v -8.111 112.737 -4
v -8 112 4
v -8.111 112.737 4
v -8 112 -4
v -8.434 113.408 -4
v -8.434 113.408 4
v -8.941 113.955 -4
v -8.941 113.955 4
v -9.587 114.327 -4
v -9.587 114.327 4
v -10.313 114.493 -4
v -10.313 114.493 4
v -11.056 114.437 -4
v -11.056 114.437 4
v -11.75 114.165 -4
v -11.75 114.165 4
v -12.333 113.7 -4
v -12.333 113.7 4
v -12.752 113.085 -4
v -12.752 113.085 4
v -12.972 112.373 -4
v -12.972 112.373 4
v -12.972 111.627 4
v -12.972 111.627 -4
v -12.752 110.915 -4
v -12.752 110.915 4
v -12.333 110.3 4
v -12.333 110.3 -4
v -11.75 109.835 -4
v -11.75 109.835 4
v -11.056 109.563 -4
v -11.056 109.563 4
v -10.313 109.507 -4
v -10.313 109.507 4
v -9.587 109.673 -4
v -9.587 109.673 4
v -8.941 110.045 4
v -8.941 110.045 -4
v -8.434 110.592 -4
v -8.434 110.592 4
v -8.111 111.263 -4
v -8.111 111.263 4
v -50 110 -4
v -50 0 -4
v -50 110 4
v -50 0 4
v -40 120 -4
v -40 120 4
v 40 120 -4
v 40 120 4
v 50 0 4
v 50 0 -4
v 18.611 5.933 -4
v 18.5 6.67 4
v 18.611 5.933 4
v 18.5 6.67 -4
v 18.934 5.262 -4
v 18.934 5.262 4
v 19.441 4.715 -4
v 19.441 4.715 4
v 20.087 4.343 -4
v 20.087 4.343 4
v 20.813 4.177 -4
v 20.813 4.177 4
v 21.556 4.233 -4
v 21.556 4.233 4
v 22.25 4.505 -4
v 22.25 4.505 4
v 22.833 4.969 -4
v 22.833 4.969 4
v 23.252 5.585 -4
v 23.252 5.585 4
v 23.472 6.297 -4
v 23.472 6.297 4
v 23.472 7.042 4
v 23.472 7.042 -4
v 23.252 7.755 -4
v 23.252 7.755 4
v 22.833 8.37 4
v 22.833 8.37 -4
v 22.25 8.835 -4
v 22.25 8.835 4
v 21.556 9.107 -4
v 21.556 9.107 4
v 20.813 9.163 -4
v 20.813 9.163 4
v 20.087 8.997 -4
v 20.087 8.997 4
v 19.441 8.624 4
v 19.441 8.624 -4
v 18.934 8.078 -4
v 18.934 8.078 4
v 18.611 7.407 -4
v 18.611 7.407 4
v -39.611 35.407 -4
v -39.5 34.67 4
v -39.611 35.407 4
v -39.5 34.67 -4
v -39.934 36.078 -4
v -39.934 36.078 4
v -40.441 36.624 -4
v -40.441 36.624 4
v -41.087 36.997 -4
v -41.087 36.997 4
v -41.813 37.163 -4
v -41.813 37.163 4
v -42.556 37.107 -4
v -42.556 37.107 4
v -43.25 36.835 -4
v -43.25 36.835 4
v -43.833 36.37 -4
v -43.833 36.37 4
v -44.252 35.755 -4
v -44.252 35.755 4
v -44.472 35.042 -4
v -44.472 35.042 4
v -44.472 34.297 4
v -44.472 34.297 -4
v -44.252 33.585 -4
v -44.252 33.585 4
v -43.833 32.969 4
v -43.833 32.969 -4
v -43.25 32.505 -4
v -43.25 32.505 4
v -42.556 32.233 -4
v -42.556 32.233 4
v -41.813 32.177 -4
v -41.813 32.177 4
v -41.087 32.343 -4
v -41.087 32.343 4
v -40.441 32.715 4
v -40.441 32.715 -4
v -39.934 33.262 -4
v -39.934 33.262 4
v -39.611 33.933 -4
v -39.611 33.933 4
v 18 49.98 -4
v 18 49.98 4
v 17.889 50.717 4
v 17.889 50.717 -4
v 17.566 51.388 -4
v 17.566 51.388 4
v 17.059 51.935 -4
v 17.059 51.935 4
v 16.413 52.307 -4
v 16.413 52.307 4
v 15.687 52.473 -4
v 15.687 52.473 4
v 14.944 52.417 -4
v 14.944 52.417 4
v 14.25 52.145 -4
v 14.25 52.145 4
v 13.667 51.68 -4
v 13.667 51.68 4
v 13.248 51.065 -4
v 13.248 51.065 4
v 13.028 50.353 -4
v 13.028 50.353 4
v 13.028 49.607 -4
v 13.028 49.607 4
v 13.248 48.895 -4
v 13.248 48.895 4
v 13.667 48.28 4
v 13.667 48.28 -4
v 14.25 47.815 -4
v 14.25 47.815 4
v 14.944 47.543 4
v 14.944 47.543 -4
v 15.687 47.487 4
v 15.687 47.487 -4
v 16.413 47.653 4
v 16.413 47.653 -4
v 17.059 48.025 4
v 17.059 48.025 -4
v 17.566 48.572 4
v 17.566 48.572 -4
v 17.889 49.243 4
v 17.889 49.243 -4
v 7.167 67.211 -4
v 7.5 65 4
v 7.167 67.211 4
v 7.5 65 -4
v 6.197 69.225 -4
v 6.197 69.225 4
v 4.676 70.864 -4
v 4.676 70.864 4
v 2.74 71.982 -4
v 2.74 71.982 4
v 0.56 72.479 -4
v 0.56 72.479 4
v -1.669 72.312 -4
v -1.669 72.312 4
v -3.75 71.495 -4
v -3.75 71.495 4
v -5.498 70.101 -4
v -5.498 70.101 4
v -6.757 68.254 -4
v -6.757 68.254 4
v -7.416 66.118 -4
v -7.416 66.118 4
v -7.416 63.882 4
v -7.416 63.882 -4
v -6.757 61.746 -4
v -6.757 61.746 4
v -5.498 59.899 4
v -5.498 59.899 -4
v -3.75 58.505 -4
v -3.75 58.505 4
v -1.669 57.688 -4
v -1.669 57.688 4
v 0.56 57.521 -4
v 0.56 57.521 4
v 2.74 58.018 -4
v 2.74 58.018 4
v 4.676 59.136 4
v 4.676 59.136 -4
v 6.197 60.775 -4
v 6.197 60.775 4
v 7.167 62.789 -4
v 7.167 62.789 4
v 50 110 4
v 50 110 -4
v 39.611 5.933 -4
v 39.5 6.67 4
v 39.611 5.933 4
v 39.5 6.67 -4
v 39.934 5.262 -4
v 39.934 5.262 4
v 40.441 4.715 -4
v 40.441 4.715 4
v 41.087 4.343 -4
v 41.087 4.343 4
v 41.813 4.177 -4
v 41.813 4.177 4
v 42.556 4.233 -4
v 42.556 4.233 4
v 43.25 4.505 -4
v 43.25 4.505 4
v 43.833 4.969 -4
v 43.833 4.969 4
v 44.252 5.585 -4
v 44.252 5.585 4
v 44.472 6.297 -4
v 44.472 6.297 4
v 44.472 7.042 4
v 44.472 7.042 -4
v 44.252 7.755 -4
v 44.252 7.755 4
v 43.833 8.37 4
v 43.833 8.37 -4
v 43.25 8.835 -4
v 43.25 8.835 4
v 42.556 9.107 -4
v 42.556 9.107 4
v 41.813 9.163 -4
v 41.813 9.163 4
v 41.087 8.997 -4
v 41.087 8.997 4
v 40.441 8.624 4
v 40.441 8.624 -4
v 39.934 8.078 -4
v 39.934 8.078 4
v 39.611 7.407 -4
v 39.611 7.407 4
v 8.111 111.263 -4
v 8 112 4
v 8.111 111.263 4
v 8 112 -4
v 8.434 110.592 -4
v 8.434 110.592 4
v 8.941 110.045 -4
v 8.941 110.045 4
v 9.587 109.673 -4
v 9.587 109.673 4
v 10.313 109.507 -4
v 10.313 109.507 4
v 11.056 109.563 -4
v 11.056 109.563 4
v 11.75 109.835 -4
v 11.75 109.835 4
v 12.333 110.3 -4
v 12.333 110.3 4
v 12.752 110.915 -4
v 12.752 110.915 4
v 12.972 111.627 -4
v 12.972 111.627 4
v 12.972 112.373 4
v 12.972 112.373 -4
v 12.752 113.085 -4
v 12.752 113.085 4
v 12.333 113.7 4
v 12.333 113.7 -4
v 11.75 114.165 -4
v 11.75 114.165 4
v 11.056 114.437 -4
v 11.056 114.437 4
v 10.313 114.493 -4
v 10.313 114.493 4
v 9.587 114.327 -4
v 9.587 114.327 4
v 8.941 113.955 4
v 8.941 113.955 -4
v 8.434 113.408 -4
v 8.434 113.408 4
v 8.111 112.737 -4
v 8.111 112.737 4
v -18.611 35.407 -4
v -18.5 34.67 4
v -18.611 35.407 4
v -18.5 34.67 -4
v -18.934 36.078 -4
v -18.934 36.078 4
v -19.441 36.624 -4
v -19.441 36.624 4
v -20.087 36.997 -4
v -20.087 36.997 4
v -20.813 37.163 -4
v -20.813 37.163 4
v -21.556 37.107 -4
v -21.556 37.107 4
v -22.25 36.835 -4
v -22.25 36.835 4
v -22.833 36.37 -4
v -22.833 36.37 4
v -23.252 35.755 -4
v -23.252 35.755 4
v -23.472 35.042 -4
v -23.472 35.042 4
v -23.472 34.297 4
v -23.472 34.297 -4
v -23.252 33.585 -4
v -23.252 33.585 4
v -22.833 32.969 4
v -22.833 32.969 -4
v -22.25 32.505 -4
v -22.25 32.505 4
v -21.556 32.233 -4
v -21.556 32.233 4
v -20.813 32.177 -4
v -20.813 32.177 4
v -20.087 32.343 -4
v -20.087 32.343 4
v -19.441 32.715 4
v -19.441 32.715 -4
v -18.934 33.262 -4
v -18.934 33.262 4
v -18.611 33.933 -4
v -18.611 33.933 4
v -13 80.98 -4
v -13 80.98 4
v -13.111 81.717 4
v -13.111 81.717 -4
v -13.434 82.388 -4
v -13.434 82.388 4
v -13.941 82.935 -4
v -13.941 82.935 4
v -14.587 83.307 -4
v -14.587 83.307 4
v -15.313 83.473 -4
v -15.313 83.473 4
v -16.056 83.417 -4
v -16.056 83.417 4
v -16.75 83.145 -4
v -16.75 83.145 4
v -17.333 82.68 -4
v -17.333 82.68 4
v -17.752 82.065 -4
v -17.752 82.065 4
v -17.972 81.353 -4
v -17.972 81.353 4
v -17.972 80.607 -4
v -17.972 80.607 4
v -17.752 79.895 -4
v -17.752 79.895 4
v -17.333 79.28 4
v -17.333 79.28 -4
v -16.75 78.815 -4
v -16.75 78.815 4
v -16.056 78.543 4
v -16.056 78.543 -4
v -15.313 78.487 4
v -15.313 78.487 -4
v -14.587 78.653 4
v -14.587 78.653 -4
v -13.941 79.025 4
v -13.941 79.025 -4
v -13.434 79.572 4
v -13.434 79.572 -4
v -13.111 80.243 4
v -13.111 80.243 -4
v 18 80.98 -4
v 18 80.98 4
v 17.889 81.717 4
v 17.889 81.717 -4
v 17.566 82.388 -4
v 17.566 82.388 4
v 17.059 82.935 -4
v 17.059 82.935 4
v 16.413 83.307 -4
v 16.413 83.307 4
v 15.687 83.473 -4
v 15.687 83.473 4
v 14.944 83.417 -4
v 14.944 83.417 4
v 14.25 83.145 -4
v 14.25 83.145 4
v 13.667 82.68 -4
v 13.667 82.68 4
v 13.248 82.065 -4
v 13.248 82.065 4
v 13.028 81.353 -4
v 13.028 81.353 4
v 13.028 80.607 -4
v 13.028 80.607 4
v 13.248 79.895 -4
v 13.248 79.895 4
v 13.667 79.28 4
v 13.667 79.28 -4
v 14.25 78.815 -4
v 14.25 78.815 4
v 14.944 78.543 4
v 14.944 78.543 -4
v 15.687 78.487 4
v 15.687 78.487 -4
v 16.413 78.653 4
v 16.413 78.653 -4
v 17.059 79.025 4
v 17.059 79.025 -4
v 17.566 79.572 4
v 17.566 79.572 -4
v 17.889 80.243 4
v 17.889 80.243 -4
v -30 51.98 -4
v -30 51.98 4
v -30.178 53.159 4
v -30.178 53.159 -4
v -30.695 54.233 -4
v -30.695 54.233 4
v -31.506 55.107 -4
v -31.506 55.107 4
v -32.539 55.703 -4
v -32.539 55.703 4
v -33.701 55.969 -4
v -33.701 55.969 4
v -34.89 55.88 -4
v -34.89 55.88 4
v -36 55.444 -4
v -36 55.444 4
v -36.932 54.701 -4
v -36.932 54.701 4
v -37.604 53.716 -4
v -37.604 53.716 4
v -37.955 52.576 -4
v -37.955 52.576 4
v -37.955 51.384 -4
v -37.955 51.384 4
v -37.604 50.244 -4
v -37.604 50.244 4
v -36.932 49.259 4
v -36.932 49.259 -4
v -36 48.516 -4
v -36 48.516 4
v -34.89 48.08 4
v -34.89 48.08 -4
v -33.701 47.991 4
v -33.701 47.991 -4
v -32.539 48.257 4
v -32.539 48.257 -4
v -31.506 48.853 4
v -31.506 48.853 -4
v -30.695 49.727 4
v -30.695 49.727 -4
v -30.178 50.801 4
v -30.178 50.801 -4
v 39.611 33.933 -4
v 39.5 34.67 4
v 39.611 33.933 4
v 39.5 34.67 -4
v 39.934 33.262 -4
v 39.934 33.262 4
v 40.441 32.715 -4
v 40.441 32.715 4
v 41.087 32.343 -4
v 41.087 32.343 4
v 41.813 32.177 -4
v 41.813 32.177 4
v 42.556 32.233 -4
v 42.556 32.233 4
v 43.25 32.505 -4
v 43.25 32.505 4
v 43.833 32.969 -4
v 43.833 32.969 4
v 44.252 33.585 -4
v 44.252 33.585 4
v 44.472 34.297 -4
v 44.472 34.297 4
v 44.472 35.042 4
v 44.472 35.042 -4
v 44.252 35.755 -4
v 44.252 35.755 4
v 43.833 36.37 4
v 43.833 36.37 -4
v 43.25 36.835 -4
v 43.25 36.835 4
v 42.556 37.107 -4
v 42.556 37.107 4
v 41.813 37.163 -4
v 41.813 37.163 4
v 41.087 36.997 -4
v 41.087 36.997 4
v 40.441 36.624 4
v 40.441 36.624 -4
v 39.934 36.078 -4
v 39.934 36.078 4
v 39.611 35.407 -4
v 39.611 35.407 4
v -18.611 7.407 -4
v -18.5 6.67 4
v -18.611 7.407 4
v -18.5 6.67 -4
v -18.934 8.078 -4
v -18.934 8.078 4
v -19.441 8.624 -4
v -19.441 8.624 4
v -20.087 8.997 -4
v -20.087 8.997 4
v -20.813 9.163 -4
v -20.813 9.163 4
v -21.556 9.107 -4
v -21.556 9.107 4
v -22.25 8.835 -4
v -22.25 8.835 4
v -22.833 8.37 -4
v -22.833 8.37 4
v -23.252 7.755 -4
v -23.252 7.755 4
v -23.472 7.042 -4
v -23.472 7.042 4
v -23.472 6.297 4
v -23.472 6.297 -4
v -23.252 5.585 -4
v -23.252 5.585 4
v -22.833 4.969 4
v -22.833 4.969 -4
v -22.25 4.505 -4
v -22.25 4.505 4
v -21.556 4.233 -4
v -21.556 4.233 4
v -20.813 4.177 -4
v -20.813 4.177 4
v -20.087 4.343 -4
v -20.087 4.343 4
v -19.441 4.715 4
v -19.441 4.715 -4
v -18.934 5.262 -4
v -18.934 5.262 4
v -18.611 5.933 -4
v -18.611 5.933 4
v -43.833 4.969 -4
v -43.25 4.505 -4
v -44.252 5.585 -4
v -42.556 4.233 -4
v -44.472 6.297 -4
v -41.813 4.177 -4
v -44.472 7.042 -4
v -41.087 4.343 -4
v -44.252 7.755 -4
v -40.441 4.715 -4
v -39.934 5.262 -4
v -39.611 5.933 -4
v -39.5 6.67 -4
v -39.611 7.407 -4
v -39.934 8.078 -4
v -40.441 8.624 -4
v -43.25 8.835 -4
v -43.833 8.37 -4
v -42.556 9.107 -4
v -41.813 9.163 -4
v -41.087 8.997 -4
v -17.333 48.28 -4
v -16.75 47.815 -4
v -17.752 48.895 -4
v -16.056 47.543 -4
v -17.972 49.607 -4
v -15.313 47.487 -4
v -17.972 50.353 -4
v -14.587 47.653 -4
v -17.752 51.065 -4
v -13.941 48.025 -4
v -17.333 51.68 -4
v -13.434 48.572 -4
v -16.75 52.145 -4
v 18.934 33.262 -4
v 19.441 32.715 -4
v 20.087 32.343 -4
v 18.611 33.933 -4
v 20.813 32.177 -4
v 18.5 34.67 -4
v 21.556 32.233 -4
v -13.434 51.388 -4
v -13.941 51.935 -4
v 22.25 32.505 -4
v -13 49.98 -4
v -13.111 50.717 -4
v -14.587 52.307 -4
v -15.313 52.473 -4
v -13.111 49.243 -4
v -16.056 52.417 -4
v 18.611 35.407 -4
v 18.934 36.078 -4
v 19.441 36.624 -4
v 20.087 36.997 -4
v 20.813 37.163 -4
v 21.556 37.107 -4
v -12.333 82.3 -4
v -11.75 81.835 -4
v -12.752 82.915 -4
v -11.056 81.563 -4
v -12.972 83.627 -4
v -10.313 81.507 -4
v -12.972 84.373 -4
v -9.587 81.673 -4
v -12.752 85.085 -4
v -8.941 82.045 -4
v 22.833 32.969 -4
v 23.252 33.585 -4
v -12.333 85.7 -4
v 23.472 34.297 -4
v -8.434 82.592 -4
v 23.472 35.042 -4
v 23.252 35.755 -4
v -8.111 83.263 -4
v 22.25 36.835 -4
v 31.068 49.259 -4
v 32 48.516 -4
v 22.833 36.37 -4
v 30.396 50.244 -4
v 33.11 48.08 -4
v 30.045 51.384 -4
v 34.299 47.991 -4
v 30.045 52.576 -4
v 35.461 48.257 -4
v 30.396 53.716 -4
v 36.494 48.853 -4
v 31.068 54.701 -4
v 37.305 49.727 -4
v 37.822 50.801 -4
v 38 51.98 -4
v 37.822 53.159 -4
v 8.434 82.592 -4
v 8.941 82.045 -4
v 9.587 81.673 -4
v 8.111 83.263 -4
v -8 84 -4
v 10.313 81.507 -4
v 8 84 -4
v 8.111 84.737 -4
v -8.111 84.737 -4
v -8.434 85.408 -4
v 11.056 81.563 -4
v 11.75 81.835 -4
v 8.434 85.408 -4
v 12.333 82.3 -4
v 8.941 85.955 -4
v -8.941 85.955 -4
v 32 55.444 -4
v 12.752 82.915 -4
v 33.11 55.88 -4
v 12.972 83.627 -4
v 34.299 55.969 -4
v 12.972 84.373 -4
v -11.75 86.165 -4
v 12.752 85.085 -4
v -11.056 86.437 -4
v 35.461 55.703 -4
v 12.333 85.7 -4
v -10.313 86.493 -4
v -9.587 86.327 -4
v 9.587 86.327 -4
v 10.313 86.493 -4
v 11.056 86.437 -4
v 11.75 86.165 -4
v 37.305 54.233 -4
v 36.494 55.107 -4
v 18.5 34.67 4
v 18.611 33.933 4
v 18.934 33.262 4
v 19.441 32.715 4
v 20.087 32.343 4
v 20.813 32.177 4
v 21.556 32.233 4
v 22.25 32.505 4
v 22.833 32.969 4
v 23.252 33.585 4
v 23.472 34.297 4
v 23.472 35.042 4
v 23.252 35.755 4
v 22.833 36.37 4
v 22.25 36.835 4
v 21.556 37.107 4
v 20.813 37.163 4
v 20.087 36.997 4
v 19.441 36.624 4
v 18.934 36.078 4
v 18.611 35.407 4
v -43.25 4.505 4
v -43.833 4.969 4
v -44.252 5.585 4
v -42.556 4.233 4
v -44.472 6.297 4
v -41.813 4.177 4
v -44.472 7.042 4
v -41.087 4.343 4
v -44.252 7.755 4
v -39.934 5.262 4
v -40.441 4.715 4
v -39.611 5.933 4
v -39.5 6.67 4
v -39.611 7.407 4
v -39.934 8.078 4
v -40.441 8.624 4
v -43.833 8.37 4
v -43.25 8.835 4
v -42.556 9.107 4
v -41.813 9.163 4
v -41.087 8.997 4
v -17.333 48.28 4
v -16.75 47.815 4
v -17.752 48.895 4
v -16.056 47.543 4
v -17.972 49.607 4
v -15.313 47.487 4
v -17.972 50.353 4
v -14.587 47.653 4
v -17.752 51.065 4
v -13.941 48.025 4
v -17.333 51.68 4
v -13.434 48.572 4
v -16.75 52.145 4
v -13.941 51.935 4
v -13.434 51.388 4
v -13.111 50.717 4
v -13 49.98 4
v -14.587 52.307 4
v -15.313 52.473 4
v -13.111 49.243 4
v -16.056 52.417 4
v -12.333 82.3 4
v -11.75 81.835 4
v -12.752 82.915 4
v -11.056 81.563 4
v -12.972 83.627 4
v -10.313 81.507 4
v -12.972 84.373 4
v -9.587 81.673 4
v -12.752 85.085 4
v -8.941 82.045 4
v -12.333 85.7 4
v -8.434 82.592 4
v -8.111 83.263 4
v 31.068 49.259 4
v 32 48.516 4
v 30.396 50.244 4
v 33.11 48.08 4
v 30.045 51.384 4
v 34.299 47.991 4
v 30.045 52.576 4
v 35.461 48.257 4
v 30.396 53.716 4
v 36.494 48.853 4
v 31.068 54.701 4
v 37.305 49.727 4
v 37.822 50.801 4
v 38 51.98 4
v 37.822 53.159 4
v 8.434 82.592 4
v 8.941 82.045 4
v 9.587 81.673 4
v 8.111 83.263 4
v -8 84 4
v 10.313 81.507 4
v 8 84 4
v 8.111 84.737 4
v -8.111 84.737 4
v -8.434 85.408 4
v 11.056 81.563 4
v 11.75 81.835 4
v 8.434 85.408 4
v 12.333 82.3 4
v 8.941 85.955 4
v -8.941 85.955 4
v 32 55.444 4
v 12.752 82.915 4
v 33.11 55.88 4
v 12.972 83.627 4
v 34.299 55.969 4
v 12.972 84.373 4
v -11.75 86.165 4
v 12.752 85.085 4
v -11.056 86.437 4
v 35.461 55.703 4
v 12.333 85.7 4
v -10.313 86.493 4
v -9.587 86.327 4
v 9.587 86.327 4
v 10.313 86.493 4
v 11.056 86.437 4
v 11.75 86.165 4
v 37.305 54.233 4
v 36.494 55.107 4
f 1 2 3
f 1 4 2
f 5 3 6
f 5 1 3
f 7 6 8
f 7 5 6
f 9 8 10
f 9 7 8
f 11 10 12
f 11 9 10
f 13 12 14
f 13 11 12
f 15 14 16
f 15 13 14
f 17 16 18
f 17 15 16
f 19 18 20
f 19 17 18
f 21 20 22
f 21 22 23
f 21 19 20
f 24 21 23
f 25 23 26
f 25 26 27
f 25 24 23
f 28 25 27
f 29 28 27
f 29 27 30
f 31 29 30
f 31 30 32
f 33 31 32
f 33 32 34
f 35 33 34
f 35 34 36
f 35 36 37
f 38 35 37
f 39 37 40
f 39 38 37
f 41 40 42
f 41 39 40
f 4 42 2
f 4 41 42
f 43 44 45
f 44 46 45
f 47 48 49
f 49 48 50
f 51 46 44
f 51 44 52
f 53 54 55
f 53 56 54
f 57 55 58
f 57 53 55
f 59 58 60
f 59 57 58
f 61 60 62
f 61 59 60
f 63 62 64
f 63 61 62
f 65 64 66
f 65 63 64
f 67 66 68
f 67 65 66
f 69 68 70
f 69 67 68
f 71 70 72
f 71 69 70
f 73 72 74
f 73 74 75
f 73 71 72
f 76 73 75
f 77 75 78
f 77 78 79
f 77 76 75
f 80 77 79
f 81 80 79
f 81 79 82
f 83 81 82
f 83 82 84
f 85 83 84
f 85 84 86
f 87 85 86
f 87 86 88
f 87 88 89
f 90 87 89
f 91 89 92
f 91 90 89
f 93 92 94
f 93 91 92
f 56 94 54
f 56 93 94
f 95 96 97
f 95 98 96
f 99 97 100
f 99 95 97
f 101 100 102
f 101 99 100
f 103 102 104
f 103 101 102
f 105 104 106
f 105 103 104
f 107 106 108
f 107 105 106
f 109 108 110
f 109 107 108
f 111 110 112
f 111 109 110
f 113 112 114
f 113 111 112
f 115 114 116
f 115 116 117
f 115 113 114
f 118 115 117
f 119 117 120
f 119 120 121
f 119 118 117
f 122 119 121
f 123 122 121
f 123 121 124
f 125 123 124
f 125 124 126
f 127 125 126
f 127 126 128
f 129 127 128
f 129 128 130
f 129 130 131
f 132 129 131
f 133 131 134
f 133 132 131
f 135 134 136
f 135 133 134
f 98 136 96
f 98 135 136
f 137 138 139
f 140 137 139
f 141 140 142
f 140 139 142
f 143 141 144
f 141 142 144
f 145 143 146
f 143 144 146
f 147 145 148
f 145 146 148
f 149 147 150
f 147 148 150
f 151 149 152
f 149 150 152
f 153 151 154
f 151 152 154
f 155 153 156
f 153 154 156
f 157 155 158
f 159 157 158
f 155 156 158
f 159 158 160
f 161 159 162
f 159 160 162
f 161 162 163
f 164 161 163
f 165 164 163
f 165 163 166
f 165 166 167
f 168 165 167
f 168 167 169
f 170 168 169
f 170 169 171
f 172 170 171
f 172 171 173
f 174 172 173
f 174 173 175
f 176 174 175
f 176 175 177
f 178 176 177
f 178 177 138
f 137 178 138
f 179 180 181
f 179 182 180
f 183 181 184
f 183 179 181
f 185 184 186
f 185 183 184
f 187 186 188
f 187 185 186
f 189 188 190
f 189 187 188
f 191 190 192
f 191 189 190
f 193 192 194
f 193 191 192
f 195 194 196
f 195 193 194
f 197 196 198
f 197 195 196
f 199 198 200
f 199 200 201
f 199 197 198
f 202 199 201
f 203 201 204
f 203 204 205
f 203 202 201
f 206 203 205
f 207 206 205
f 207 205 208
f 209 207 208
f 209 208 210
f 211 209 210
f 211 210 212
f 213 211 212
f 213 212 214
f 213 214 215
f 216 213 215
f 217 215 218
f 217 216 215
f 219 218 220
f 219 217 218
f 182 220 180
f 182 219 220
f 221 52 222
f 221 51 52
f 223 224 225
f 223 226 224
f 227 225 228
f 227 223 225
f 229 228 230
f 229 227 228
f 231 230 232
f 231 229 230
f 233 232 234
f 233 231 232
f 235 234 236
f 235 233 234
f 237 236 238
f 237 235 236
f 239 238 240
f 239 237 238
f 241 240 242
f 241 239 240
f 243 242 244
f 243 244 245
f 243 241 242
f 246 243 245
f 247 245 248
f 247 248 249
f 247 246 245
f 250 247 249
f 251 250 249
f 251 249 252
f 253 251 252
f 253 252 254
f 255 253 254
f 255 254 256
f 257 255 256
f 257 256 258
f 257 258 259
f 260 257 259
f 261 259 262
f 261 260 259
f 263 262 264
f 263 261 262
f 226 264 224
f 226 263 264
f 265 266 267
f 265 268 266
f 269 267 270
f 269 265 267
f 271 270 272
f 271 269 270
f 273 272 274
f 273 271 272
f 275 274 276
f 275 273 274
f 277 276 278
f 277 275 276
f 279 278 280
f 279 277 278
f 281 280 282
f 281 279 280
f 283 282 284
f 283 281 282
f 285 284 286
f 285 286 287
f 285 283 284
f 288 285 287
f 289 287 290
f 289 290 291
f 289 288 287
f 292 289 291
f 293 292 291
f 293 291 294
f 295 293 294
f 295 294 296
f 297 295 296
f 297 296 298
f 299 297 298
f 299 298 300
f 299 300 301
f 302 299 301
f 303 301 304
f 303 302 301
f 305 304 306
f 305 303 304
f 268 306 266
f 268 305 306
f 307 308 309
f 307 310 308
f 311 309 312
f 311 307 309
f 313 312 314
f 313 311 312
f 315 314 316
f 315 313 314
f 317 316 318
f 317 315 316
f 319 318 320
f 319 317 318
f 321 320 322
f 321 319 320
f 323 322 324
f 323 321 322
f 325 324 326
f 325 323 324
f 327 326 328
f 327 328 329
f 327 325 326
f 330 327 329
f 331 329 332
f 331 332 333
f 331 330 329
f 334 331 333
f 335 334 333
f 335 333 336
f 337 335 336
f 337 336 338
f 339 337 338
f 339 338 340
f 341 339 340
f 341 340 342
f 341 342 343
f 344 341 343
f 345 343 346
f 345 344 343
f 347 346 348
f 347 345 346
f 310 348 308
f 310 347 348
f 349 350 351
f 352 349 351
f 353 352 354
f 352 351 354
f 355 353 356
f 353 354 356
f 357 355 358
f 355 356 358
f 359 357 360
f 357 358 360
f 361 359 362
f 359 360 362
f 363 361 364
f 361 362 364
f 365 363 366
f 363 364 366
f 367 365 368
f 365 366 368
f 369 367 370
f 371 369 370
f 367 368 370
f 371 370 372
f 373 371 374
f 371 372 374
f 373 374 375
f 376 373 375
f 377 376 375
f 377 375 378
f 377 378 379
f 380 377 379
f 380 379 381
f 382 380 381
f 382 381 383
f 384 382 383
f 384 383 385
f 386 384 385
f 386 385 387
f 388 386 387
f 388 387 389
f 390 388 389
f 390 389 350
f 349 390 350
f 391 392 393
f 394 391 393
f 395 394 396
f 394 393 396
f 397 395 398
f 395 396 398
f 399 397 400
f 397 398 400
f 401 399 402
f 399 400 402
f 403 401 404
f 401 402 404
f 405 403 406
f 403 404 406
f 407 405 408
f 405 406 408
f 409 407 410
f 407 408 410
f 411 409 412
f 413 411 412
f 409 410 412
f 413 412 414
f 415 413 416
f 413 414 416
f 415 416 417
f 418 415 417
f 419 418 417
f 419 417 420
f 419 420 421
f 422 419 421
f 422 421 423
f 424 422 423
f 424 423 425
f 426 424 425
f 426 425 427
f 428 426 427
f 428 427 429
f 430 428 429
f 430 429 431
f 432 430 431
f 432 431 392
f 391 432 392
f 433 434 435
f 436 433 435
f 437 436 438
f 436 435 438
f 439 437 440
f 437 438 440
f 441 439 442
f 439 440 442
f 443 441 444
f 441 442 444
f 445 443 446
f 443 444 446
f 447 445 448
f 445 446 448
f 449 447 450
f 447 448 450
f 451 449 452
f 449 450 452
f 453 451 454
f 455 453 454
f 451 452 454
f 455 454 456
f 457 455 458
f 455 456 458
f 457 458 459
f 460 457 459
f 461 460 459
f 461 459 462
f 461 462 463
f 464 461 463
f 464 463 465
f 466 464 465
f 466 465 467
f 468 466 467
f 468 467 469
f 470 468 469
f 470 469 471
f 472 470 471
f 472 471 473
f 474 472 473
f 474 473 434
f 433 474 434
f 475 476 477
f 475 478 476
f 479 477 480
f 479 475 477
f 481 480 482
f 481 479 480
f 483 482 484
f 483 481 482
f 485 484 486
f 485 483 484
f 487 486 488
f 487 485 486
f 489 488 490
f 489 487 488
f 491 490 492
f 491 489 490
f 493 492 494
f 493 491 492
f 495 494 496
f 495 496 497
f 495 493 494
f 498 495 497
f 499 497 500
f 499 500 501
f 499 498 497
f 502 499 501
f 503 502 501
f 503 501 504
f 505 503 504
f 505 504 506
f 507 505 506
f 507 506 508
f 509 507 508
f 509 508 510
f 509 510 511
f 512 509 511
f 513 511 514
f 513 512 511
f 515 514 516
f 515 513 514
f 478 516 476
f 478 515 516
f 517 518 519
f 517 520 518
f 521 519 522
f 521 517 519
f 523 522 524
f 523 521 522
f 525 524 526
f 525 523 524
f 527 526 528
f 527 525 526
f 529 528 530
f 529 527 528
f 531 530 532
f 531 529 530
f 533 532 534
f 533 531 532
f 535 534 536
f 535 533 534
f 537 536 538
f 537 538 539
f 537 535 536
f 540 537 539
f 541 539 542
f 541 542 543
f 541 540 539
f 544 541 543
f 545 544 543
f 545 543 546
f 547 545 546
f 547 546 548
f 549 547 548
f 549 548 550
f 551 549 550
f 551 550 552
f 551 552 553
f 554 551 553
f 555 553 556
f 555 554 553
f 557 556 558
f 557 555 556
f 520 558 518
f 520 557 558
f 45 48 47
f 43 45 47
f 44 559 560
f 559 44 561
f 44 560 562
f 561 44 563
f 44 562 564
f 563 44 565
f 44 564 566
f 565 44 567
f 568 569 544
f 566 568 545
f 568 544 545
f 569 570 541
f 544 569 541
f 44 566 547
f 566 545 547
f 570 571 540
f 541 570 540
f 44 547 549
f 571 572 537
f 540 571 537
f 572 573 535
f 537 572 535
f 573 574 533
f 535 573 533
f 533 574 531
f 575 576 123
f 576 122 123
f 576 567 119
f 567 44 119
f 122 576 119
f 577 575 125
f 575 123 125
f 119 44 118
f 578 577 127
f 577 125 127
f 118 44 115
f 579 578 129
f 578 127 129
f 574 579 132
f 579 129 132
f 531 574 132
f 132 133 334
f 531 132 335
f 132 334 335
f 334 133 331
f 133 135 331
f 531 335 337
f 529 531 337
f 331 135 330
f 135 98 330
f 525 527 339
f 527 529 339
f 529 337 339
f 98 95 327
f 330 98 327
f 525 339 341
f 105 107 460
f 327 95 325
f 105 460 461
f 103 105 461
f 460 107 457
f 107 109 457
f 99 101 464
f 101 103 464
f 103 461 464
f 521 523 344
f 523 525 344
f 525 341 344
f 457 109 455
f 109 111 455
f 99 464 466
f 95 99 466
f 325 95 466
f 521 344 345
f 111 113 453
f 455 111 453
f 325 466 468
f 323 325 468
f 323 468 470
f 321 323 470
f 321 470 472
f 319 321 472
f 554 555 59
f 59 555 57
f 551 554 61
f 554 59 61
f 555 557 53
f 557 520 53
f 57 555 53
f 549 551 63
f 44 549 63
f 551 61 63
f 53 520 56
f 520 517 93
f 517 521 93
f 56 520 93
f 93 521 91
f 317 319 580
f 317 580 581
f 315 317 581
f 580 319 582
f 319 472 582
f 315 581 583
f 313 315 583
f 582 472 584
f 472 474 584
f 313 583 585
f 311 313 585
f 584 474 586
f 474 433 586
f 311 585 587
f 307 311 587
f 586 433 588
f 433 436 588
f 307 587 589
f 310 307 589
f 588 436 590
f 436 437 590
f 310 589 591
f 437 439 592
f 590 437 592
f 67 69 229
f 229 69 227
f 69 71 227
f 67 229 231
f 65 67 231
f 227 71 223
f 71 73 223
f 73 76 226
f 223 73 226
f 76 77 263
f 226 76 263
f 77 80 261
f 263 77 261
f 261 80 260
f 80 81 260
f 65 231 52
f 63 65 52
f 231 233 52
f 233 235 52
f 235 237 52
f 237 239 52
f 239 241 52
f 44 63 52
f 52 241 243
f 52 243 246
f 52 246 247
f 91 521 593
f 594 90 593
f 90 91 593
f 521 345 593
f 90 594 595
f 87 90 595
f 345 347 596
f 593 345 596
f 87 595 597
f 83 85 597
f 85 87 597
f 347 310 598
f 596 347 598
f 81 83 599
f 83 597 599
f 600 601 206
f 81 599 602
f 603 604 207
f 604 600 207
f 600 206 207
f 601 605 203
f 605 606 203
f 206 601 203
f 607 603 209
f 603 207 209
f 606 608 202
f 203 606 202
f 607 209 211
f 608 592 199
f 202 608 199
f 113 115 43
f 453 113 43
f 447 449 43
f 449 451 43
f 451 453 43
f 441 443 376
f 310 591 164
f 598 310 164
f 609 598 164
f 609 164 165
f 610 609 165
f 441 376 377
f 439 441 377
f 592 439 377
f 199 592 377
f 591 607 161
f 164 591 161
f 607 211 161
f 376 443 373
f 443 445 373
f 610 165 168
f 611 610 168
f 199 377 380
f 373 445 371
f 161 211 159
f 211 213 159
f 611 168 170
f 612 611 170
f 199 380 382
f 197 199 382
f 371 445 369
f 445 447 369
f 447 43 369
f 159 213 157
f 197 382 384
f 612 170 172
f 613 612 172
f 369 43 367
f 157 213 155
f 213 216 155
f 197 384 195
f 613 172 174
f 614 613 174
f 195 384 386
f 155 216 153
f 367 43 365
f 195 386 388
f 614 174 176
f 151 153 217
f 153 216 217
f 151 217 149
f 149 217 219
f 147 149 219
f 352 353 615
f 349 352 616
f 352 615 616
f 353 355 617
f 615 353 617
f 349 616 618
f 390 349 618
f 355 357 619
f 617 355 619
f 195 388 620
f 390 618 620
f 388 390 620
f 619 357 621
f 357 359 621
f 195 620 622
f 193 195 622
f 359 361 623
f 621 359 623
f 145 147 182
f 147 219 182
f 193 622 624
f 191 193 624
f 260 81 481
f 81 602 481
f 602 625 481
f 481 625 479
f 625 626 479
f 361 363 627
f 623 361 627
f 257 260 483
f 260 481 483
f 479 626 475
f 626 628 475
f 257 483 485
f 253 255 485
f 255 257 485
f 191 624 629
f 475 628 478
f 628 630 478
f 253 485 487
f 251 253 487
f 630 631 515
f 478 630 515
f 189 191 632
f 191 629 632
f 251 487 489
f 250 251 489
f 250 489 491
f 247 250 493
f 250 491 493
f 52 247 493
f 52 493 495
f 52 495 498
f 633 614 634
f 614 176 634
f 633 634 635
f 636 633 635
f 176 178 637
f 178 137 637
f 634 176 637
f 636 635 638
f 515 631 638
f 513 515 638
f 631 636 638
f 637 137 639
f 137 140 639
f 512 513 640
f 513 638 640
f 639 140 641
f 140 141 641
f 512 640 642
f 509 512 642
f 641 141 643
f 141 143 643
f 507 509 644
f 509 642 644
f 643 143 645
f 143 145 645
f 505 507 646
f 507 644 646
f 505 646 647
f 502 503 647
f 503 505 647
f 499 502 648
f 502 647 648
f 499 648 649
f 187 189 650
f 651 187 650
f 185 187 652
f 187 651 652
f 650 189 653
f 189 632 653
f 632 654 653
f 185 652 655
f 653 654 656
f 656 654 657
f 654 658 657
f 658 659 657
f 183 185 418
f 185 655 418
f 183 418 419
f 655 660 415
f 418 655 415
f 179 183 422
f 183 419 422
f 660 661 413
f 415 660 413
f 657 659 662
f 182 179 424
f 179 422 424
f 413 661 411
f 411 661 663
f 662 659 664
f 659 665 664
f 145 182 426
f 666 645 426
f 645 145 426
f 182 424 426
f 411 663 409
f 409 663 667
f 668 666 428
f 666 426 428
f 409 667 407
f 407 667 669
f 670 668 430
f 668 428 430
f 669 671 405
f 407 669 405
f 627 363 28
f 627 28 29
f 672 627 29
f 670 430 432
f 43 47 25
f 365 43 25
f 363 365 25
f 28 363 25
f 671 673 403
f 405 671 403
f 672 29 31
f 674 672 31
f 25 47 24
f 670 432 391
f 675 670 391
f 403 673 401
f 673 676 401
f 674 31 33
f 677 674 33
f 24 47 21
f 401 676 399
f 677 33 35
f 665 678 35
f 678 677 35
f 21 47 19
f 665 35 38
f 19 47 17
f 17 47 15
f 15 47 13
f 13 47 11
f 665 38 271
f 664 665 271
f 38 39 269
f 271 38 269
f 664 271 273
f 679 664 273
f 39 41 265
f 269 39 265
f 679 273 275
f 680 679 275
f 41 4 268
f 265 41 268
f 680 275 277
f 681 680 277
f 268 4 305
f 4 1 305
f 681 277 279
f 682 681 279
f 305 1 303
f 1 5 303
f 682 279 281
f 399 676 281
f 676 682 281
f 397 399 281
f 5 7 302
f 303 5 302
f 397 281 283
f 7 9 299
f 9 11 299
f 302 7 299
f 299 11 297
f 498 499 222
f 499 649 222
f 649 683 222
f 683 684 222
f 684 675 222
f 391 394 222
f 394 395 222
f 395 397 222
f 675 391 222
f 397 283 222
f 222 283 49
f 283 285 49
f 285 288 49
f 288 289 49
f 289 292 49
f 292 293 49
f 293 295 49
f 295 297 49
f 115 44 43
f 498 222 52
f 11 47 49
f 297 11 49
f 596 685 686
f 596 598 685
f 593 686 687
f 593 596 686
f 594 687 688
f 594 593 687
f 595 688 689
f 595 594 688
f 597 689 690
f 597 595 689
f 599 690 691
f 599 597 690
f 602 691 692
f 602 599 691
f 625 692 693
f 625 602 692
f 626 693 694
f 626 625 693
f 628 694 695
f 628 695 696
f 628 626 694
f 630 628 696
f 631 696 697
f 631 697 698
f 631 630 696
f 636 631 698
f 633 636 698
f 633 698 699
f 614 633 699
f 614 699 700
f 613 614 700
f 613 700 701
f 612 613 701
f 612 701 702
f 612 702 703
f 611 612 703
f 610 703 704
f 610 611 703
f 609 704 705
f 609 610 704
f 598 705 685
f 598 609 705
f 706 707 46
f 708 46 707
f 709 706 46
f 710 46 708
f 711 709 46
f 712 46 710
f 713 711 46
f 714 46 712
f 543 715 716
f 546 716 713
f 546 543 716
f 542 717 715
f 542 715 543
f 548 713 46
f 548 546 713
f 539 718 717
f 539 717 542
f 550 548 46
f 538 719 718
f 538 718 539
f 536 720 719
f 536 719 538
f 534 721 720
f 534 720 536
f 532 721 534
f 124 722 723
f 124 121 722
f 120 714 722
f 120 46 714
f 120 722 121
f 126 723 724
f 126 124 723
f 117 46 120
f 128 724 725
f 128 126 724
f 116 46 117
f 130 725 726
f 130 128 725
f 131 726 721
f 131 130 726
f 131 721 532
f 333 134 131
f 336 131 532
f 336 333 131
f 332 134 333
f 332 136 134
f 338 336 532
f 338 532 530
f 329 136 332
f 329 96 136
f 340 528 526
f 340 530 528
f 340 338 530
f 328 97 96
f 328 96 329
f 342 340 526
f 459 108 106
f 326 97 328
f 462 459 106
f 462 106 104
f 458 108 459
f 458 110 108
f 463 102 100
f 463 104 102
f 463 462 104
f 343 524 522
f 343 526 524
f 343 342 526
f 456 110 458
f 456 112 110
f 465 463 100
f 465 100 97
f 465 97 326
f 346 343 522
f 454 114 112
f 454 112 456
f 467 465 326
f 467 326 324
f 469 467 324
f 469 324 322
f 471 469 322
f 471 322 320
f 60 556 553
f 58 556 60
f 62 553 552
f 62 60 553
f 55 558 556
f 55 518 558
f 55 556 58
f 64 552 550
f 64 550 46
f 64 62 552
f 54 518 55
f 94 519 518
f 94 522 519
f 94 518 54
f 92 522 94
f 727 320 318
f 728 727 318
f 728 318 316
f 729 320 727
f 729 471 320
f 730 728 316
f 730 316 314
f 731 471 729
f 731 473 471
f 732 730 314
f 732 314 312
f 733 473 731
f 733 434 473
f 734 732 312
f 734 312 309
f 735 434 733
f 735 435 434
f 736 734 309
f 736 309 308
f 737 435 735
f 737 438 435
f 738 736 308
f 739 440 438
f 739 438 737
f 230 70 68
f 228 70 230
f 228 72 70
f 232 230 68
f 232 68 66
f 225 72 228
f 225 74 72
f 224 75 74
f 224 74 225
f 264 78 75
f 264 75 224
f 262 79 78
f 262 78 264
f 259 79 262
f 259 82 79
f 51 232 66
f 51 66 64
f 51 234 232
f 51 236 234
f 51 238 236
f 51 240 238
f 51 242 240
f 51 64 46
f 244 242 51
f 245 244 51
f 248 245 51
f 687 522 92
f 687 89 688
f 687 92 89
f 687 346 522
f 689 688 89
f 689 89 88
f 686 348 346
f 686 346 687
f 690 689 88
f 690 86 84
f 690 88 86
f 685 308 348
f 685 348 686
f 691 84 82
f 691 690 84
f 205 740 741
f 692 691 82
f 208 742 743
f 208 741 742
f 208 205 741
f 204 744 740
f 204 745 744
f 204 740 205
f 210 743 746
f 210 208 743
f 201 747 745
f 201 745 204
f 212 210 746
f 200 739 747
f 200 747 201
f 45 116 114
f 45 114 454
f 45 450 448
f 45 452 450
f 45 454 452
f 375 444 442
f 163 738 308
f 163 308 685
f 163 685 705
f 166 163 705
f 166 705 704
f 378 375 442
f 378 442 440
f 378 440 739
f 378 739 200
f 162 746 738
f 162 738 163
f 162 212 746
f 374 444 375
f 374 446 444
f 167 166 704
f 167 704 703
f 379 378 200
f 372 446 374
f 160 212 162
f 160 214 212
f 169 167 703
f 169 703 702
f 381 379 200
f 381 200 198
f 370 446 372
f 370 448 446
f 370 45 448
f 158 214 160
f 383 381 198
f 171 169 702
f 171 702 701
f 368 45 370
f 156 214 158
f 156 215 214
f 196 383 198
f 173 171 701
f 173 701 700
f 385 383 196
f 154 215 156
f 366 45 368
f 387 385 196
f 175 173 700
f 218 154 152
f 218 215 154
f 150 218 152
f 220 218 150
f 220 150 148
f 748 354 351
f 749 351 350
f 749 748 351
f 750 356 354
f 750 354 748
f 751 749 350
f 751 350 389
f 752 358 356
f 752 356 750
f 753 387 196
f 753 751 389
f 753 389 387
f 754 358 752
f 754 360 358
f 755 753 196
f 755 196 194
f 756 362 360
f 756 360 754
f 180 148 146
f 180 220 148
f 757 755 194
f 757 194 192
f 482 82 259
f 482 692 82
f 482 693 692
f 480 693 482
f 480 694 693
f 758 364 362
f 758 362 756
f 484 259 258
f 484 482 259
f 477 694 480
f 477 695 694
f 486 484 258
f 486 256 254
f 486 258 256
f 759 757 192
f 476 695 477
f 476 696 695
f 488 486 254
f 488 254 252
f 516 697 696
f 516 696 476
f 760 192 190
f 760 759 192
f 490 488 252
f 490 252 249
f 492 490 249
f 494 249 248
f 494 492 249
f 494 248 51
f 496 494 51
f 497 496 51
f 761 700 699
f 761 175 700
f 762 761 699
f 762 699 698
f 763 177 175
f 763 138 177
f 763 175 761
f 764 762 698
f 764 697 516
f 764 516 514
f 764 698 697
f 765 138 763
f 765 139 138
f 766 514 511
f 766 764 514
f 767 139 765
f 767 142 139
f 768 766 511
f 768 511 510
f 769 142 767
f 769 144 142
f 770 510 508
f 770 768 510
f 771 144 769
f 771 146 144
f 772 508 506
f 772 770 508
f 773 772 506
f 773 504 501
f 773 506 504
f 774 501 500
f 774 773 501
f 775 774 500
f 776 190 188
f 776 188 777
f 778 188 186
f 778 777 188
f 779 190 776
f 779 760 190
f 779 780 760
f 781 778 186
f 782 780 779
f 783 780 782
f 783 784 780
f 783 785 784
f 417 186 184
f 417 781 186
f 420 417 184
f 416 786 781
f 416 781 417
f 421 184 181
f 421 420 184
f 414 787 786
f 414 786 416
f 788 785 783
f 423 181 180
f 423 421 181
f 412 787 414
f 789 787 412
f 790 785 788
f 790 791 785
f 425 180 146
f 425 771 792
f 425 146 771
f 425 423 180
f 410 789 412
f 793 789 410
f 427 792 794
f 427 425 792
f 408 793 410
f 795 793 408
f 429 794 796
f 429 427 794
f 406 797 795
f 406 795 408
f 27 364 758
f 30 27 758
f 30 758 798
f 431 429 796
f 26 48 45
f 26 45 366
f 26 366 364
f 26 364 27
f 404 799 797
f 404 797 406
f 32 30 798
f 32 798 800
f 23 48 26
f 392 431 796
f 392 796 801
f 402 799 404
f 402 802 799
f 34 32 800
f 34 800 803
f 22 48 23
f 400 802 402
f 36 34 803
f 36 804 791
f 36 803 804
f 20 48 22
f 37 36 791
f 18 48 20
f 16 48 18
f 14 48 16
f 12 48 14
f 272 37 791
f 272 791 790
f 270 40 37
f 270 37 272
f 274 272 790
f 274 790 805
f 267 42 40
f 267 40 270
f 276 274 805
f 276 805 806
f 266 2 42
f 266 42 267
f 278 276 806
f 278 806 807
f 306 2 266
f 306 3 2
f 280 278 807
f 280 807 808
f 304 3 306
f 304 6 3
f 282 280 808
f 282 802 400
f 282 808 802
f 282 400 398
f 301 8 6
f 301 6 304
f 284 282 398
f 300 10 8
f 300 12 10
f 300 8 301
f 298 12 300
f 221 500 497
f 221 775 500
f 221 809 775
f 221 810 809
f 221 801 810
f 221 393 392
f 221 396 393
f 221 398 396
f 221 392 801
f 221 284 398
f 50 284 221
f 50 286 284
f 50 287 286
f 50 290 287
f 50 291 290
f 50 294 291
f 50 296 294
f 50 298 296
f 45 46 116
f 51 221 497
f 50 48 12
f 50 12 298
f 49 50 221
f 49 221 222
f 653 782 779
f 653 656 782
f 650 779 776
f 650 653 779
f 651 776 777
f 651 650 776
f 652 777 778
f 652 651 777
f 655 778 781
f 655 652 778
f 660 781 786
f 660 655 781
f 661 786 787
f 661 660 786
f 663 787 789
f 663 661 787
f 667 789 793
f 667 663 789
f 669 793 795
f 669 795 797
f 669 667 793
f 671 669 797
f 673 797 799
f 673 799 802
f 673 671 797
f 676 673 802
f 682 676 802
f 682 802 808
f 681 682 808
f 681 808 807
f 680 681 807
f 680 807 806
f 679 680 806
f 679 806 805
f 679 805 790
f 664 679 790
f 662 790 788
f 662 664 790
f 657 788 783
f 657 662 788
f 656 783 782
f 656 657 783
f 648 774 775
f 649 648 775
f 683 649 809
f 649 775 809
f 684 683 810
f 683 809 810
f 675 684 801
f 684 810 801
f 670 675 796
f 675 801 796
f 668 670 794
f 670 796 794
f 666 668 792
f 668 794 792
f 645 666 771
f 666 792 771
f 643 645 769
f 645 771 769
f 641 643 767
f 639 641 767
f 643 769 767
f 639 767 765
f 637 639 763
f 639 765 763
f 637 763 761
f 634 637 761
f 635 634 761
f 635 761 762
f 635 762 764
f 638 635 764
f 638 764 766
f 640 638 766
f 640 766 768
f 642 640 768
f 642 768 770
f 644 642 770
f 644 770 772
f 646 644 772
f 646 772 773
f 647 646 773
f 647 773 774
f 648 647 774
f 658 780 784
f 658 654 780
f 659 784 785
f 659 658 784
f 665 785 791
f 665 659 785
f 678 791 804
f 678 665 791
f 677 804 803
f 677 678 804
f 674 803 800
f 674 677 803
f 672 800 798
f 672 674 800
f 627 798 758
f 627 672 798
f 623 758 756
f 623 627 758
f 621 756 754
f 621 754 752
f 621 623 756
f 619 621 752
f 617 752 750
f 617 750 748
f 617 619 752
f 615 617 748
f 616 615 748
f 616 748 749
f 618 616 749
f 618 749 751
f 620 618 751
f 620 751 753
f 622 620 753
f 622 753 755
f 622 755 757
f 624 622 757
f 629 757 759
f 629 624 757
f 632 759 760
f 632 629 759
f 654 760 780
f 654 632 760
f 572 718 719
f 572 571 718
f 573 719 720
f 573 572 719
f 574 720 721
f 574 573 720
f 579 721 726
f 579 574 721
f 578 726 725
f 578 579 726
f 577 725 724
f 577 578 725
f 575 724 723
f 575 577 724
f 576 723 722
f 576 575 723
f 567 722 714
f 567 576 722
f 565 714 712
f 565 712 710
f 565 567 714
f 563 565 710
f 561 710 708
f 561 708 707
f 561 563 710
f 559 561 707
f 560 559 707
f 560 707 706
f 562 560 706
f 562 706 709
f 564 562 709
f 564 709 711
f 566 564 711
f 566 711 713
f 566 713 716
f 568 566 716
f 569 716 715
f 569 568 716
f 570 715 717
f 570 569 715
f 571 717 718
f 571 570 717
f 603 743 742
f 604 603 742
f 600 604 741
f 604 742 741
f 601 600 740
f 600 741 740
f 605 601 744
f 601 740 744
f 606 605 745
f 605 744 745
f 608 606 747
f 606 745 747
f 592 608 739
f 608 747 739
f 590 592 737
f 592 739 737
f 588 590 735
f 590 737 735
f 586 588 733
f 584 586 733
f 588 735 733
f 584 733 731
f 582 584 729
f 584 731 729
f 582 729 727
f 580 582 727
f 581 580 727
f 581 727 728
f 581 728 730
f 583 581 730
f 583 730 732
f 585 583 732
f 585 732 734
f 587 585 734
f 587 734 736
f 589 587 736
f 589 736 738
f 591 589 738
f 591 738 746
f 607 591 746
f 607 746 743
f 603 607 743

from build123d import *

# Parameters (mm, degrees)
SKETCH1_W           = 100
SKETCH1_H           = 120
SKETCH1_R           = 2.5
SKETCH1_R_2         = 7.5
BOSS_EXTRUDE1_DEPTH = 4
CHAMFER1_SIZE       = 10
SKETCH2_R           = 2.5
SKETCH2_R_2         = 4
CUT_EXTRUDE1_DEPTH  = 131.245921241


with BuildPart() as part:
    # Sketch1 → Boss-Extrude1 (new, symmetric)
    with BuildSketch(Plane.XY):
        with Locations((0, 60)):
            Rectangle(SKETCH1_W, SKETCH1_H)
        with Locations((-42, 6.66986634)):
            Circle(SKETCH1_R, mode=Mode.SUBTRACT)
        with Locations((-21, 6.66986634)):
            Circle(SKETCH1_R, mode=Mode.SUBTRACT)
        with Locations((-42, 34.66986634)):
            Circle(SKETCH1_R, mode=Mode.SUBTRACT)
        with Locations((-21, 34.66986634)):
            Circle(SKETCH1_R, mode=Mode.SUBTRACT)
        with Locations((-10.5, 112)):
            Circle(SKETCH1_R, mode=Mode.SUBTRACT)
        with Locations((-10.5, 84)):
            Circle(SKETCH1_R, mode=Mode.SUBTRACT)
        with Locations((10.5, 84)):
            Circle(SKETCH1_R, mode=Mode.SUBTRACT)
        with Locations((10.5, 112)):
            Circle(SKETCH1_R, mode=Mode.SUBTRACT)
        with Locations((21, 34.66986634)):
            Circle(SKETCH1_R, mode=Mode.SUBTRACT)
        with Locations((42, 34.66986634)):
            Circle(SKETCH1_R, mode=Mode.SUBTRACT)
        with Locations((21, 6.66986634)):
            Circle(SKETCH1_R, mode=Mode.SUBTRACT)
        with Locations((42, 6.66986634)):
            Circle(SKETCH1_R, mode=Mode.SUBTRACT)
        with Locations((0, 65)):
            Circle(SKETCH1_R_2, mode=Mode.SUBTRACT)
    extrude(amount=BOSS_EXTRUDE1_DEPTH, both=True)

    # Chamfer1
    chamfer1_edges = [part.edges().sort_by_distance(p)[0] for p in [
        (50, 120, 0),
        (-50, 120, 0),
    ]]
    chamfer(chamfer1_edges, length=CHAMFER1_SIZE)

    # Sketch2 → Cut-Extrude1 (cut, through all)
    with BuildSketch(Plane.XY.offset(4)):
        with Locations((-15.5, 80.98)):
            Circle(SKETCH2_R)
        with Locations((-15.5, 49.98)):
            Circle(SKETCH2_R)
        with Locations((15.5, 80.98)):
            Circle(SKETCH2_R)
        with Locations((15.5, 49.98)):
            Circle(SKETCH2_R)
        with Locations((-34, 51.98)):
            Circle(SKETCH2_R_2)
        with Locations((34, 51.98)):
            Circle(SKETCH2_R_2)
    extrude(amount=-CUT_EXTRUDE1_DEPTH, mode=Mode.SUBTRACT)


solid = part.part
